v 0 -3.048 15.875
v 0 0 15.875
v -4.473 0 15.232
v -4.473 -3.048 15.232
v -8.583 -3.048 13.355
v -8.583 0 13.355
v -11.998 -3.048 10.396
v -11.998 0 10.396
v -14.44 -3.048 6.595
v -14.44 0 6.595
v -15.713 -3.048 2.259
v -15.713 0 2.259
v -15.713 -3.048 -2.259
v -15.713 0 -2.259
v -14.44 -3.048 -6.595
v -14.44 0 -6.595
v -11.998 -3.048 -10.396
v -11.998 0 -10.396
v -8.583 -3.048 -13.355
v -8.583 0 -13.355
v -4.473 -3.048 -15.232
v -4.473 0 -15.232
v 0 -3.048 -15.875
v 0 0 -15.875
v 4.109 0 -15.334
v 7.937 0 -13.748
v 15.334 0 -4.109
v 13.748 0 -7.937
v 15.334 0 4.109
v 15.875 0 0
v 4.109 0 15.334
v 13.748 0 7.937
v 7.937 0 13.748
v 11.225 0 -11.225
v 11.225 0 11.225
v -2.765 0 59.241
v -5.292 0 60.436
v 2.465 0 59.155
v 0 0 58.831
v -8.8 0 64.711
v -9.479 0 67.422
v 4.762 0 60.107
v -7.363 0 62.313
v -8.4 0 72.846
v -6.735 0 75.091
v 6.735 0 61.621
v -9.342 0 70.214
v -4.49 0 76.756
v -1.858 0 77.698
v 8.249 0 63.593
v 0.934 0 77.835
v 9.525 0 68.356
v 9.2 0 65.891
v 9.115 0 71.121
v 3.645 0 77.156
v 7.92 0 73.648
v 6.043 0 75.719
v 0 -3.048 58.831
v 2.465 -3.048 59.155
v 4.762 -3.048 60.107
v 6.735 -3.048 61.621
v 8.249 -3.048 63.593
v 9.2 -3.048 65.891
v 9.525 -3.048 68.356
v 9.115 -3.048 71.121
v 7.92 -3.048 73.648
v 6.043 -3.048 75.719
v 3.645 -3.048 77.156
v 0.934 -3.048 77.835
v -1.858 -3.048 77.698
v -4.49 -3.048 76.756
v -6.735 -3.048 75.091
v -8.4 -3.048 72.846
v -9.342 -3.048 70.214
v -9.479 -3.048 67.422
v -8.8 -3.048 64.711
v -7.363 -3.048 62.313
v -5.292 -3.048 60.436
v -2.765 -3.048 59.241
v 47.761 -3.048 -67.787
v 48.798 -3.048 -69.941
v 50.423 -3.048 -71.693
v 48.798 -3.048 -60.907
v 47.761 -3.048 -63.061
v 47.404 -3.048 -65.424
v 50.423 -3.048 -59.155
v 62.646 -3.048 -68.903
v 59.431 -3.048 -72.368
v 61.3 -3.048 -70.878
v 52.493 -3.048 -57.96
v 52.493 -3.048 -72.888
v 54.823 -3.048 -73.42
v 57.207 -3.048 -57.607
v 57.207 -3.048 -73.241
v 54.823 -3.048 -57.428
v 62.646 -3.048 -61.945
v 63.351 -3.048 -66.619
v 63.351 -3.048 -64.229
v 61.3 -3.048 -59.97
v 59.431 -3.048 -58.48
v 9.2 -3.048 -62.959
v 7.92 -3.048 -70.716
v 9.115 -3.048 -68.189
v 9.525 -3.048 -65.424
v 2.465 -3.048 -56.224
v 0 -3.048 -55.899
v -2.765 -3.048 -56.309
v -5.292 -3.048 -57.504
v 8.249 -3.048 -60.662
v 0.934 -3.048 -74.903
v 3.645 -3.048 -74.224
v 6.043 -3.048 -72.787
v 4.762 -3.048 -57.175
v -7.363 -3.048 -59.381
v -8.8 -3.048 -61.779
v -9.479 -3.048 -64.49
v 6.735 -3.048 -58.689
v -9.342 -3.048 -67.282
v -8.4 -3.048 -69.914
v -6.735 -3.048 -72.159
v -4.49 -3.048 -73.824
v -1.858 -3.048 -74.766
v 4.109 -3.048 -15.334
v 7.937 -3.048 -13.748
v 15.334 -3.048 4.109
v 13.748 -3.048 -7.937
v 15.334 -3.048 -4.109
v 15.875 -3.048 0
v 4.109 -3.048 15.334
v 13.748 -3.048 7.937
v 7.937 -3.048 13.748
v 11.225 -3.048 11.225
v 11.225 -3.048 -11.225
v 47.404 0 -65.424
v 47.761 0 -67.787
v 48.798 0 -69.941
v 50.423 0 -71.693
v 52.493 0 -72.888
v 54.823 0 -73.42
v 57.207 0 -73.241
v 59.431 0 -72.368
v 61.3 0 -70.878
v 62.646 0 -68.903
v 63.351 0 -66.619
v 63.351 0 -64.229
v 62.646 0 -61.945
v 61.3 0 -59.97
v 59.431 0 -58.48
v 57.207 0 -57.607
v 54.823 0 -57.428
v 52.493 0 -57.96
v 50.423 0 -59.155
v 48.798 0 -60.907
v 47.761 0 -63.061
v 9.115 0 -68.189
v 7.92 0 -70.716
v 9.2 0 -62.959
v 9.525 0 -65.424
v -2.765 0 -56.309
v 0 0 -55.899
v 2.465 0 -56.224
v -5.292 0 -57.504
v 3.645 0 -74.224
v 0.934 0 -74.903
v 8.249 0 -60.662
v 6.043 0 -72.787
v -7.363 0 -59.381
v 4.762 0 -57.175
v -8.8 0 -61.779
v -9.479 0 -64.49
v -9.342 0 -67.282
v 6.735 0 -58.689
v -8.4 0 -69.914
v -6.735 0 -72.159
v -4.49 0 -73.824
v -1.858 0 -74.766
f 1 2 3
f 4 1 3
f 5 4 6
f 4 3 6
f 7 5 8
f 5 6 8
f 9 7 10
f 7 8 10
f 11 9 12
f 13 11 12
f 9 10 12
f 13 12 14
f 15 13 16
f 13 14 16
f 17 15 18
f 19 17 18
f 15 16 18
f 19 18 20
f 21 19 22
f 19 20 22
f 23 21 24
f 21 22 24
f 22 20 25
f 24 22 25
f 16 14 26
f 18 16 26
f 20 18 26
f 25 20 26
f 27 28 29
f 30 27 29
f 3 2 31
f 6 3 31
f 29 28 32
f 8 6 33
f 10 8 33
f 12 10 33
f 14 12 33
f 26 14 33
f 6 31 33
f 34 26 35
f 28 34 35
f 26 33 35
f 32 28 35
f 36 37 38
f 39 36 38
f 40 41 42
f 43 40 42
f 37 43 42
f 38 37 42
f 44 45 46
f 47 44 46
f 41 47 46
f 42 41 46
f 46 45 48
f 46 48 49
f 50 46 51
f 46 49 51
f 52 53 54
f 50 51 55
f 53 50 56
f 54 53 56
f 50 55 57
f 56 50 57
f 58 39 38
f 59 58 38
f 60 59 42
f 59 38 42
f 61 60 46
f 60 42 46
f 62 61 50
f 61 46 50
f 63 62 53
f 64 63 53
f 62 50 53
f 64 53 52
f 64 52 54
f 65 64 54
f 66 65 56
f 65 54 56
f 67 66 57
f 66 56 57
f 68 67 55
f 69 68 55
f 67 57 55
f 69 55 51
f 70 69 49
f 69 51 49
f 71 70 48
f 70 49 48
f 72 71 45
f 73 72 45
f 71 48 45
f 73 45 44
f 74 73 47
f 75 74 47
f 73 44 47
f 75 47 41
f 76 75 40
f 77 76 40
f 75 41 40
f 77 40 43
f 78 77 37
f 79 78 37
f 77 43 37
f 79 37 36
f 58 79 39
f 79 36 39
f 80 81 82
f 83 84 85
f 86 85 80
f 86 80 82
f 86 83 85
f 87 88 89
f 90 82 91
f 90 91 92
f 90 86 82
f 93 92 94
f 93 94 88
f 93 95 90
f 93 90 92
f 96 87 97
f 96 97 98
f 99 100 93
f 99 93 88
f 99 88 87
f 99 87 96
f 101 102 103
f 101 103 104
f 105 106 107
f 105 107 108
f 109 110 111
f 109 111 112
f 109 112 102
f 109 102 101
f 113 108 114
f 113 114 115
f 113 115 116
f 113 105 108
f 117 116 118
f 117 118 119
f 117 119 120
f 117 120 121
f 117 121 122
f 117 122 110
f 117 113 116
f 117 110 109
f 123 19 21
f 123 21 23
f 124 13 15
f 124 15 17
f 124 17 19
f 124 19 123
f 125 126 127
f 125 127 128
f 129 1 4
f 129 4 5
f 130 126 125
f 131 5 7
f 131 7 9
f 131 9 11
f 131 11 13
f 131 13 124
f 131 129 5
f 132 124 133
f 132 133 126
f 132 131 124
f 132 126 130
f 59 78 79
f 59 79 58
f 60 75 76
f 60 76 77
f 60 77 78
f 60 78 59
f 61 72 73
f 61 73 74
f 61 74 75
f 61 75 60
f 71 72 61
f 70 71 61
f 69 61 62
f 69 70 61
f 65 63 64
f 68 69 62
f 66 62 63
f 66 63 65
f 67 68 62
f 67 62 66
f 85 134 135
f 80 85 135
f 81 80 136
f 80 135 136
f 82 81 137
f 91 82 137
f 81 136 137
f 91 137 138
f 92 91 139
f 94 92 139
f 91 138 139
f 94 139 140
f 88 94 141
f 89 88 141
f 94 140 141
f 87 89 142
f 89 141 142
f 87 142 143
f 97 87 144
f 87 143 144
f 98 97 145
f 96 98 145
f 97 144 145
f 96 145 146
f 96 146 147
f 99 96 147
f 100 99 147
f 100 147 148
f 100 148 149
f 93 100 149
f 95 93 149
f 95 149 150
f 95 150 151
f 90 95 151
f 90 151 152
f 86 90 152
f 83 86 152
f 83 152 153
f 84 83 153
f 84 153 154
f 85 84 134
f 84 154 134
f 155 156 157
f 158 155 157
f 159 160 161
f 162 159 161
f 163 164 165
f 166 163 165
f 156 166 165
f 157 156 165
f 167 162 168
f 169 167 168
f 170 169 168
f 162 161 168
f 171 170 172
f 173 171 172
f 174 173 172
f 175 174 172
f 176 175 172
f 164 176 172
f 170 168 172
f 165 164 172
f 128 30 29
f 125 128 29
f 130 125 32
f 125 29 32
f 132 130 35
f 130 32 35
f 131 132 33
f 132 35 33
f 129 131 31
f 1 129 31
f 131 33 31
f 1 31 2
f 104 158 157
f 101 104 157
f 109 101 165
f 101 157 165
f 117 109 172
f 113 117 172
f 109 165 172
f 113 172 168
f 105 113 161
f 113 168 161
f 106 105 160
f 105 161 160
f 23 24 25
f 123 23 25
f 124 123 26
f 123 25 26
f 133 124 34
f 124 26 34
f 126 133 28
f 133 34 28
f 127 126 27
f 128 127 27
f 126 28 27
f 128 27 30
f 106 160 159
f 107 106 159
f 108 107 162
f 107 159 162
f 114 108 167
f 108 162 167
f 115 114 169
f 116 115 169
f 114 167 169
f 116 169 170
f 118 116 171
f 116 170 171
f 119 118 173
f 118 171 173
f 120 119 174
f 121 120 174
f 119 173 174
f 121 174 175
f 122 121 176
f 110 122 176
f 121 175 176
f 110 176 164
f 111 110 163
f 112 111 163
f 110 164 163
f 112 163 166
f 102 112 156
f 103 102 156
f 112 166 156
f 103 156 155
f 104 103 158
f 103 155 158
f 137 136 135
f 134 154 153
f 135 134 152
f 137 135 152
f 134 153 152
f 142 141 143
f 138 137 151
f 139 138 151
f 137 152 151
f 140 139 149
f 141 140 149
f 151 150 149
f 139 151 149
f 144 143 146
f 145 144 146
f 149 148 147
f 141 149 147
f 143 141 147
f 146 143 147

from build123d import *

# Parameters (mm, degrees)
F1_DEPTH = 3.048


with BuildPart() as f1:
    # F0 (on Front) → F1 (new body)
    with BuildSketch(Plane.XZ):
        with BuildLine():
            Line((0, -65.424003), (9.525, -65.424003))
            ThreePointArc((9.525, -65.424003), (6.735192, -58.688811), (0, -55.899003))
            Line((0, -55.899003), (0, -65.424003))
        make_face()
        with BuildLine():
            ThreePointArc((9.525, 68.355888), (-6.735192, 75.09108), (0, 58.830888))
            ThreePointArc((0, 58.830888), (6.735192, 61.620696), (9.525, 68.355888))
        make_face()
        with BuildLine():
            ThreePointArc((0, 15.875), (-15.875, 0), (0, -15.875))
            Line((0, -15.875), (0, 15.875))
        make_face()
        with BuildLine():
            Line((0, 15.875), (0, -15.875))
            ThreePointArc((0, -15.875), (11.22532, -11.22532), (15.875, 0))
            ThreePointArc((15.875, 0), (11.22532, 11.22532), (0, 15.875))
        make_face()
        with BuildLine():
            ThreePointArc((0, -55.899003), (-6.735192, -72.159195), (9.525, -65.424003))
            Line((9.525, -65.424003), (0, -65.424003))
            Line((0, -65.424003), (0, -55.899003))
        make_face()
        with BuildLine():
            ThreePointArc((63.440335, -65.424003), (55.422384, -57.406052), (47.404434, -65.424003))
            ThreePointArc((47.404434, -65.424003), (55.422384, -73.441953), (63.440335, -65.424003))
        make_face()
    extrude(amount=F1_DEPTH)


solid = f1.part
